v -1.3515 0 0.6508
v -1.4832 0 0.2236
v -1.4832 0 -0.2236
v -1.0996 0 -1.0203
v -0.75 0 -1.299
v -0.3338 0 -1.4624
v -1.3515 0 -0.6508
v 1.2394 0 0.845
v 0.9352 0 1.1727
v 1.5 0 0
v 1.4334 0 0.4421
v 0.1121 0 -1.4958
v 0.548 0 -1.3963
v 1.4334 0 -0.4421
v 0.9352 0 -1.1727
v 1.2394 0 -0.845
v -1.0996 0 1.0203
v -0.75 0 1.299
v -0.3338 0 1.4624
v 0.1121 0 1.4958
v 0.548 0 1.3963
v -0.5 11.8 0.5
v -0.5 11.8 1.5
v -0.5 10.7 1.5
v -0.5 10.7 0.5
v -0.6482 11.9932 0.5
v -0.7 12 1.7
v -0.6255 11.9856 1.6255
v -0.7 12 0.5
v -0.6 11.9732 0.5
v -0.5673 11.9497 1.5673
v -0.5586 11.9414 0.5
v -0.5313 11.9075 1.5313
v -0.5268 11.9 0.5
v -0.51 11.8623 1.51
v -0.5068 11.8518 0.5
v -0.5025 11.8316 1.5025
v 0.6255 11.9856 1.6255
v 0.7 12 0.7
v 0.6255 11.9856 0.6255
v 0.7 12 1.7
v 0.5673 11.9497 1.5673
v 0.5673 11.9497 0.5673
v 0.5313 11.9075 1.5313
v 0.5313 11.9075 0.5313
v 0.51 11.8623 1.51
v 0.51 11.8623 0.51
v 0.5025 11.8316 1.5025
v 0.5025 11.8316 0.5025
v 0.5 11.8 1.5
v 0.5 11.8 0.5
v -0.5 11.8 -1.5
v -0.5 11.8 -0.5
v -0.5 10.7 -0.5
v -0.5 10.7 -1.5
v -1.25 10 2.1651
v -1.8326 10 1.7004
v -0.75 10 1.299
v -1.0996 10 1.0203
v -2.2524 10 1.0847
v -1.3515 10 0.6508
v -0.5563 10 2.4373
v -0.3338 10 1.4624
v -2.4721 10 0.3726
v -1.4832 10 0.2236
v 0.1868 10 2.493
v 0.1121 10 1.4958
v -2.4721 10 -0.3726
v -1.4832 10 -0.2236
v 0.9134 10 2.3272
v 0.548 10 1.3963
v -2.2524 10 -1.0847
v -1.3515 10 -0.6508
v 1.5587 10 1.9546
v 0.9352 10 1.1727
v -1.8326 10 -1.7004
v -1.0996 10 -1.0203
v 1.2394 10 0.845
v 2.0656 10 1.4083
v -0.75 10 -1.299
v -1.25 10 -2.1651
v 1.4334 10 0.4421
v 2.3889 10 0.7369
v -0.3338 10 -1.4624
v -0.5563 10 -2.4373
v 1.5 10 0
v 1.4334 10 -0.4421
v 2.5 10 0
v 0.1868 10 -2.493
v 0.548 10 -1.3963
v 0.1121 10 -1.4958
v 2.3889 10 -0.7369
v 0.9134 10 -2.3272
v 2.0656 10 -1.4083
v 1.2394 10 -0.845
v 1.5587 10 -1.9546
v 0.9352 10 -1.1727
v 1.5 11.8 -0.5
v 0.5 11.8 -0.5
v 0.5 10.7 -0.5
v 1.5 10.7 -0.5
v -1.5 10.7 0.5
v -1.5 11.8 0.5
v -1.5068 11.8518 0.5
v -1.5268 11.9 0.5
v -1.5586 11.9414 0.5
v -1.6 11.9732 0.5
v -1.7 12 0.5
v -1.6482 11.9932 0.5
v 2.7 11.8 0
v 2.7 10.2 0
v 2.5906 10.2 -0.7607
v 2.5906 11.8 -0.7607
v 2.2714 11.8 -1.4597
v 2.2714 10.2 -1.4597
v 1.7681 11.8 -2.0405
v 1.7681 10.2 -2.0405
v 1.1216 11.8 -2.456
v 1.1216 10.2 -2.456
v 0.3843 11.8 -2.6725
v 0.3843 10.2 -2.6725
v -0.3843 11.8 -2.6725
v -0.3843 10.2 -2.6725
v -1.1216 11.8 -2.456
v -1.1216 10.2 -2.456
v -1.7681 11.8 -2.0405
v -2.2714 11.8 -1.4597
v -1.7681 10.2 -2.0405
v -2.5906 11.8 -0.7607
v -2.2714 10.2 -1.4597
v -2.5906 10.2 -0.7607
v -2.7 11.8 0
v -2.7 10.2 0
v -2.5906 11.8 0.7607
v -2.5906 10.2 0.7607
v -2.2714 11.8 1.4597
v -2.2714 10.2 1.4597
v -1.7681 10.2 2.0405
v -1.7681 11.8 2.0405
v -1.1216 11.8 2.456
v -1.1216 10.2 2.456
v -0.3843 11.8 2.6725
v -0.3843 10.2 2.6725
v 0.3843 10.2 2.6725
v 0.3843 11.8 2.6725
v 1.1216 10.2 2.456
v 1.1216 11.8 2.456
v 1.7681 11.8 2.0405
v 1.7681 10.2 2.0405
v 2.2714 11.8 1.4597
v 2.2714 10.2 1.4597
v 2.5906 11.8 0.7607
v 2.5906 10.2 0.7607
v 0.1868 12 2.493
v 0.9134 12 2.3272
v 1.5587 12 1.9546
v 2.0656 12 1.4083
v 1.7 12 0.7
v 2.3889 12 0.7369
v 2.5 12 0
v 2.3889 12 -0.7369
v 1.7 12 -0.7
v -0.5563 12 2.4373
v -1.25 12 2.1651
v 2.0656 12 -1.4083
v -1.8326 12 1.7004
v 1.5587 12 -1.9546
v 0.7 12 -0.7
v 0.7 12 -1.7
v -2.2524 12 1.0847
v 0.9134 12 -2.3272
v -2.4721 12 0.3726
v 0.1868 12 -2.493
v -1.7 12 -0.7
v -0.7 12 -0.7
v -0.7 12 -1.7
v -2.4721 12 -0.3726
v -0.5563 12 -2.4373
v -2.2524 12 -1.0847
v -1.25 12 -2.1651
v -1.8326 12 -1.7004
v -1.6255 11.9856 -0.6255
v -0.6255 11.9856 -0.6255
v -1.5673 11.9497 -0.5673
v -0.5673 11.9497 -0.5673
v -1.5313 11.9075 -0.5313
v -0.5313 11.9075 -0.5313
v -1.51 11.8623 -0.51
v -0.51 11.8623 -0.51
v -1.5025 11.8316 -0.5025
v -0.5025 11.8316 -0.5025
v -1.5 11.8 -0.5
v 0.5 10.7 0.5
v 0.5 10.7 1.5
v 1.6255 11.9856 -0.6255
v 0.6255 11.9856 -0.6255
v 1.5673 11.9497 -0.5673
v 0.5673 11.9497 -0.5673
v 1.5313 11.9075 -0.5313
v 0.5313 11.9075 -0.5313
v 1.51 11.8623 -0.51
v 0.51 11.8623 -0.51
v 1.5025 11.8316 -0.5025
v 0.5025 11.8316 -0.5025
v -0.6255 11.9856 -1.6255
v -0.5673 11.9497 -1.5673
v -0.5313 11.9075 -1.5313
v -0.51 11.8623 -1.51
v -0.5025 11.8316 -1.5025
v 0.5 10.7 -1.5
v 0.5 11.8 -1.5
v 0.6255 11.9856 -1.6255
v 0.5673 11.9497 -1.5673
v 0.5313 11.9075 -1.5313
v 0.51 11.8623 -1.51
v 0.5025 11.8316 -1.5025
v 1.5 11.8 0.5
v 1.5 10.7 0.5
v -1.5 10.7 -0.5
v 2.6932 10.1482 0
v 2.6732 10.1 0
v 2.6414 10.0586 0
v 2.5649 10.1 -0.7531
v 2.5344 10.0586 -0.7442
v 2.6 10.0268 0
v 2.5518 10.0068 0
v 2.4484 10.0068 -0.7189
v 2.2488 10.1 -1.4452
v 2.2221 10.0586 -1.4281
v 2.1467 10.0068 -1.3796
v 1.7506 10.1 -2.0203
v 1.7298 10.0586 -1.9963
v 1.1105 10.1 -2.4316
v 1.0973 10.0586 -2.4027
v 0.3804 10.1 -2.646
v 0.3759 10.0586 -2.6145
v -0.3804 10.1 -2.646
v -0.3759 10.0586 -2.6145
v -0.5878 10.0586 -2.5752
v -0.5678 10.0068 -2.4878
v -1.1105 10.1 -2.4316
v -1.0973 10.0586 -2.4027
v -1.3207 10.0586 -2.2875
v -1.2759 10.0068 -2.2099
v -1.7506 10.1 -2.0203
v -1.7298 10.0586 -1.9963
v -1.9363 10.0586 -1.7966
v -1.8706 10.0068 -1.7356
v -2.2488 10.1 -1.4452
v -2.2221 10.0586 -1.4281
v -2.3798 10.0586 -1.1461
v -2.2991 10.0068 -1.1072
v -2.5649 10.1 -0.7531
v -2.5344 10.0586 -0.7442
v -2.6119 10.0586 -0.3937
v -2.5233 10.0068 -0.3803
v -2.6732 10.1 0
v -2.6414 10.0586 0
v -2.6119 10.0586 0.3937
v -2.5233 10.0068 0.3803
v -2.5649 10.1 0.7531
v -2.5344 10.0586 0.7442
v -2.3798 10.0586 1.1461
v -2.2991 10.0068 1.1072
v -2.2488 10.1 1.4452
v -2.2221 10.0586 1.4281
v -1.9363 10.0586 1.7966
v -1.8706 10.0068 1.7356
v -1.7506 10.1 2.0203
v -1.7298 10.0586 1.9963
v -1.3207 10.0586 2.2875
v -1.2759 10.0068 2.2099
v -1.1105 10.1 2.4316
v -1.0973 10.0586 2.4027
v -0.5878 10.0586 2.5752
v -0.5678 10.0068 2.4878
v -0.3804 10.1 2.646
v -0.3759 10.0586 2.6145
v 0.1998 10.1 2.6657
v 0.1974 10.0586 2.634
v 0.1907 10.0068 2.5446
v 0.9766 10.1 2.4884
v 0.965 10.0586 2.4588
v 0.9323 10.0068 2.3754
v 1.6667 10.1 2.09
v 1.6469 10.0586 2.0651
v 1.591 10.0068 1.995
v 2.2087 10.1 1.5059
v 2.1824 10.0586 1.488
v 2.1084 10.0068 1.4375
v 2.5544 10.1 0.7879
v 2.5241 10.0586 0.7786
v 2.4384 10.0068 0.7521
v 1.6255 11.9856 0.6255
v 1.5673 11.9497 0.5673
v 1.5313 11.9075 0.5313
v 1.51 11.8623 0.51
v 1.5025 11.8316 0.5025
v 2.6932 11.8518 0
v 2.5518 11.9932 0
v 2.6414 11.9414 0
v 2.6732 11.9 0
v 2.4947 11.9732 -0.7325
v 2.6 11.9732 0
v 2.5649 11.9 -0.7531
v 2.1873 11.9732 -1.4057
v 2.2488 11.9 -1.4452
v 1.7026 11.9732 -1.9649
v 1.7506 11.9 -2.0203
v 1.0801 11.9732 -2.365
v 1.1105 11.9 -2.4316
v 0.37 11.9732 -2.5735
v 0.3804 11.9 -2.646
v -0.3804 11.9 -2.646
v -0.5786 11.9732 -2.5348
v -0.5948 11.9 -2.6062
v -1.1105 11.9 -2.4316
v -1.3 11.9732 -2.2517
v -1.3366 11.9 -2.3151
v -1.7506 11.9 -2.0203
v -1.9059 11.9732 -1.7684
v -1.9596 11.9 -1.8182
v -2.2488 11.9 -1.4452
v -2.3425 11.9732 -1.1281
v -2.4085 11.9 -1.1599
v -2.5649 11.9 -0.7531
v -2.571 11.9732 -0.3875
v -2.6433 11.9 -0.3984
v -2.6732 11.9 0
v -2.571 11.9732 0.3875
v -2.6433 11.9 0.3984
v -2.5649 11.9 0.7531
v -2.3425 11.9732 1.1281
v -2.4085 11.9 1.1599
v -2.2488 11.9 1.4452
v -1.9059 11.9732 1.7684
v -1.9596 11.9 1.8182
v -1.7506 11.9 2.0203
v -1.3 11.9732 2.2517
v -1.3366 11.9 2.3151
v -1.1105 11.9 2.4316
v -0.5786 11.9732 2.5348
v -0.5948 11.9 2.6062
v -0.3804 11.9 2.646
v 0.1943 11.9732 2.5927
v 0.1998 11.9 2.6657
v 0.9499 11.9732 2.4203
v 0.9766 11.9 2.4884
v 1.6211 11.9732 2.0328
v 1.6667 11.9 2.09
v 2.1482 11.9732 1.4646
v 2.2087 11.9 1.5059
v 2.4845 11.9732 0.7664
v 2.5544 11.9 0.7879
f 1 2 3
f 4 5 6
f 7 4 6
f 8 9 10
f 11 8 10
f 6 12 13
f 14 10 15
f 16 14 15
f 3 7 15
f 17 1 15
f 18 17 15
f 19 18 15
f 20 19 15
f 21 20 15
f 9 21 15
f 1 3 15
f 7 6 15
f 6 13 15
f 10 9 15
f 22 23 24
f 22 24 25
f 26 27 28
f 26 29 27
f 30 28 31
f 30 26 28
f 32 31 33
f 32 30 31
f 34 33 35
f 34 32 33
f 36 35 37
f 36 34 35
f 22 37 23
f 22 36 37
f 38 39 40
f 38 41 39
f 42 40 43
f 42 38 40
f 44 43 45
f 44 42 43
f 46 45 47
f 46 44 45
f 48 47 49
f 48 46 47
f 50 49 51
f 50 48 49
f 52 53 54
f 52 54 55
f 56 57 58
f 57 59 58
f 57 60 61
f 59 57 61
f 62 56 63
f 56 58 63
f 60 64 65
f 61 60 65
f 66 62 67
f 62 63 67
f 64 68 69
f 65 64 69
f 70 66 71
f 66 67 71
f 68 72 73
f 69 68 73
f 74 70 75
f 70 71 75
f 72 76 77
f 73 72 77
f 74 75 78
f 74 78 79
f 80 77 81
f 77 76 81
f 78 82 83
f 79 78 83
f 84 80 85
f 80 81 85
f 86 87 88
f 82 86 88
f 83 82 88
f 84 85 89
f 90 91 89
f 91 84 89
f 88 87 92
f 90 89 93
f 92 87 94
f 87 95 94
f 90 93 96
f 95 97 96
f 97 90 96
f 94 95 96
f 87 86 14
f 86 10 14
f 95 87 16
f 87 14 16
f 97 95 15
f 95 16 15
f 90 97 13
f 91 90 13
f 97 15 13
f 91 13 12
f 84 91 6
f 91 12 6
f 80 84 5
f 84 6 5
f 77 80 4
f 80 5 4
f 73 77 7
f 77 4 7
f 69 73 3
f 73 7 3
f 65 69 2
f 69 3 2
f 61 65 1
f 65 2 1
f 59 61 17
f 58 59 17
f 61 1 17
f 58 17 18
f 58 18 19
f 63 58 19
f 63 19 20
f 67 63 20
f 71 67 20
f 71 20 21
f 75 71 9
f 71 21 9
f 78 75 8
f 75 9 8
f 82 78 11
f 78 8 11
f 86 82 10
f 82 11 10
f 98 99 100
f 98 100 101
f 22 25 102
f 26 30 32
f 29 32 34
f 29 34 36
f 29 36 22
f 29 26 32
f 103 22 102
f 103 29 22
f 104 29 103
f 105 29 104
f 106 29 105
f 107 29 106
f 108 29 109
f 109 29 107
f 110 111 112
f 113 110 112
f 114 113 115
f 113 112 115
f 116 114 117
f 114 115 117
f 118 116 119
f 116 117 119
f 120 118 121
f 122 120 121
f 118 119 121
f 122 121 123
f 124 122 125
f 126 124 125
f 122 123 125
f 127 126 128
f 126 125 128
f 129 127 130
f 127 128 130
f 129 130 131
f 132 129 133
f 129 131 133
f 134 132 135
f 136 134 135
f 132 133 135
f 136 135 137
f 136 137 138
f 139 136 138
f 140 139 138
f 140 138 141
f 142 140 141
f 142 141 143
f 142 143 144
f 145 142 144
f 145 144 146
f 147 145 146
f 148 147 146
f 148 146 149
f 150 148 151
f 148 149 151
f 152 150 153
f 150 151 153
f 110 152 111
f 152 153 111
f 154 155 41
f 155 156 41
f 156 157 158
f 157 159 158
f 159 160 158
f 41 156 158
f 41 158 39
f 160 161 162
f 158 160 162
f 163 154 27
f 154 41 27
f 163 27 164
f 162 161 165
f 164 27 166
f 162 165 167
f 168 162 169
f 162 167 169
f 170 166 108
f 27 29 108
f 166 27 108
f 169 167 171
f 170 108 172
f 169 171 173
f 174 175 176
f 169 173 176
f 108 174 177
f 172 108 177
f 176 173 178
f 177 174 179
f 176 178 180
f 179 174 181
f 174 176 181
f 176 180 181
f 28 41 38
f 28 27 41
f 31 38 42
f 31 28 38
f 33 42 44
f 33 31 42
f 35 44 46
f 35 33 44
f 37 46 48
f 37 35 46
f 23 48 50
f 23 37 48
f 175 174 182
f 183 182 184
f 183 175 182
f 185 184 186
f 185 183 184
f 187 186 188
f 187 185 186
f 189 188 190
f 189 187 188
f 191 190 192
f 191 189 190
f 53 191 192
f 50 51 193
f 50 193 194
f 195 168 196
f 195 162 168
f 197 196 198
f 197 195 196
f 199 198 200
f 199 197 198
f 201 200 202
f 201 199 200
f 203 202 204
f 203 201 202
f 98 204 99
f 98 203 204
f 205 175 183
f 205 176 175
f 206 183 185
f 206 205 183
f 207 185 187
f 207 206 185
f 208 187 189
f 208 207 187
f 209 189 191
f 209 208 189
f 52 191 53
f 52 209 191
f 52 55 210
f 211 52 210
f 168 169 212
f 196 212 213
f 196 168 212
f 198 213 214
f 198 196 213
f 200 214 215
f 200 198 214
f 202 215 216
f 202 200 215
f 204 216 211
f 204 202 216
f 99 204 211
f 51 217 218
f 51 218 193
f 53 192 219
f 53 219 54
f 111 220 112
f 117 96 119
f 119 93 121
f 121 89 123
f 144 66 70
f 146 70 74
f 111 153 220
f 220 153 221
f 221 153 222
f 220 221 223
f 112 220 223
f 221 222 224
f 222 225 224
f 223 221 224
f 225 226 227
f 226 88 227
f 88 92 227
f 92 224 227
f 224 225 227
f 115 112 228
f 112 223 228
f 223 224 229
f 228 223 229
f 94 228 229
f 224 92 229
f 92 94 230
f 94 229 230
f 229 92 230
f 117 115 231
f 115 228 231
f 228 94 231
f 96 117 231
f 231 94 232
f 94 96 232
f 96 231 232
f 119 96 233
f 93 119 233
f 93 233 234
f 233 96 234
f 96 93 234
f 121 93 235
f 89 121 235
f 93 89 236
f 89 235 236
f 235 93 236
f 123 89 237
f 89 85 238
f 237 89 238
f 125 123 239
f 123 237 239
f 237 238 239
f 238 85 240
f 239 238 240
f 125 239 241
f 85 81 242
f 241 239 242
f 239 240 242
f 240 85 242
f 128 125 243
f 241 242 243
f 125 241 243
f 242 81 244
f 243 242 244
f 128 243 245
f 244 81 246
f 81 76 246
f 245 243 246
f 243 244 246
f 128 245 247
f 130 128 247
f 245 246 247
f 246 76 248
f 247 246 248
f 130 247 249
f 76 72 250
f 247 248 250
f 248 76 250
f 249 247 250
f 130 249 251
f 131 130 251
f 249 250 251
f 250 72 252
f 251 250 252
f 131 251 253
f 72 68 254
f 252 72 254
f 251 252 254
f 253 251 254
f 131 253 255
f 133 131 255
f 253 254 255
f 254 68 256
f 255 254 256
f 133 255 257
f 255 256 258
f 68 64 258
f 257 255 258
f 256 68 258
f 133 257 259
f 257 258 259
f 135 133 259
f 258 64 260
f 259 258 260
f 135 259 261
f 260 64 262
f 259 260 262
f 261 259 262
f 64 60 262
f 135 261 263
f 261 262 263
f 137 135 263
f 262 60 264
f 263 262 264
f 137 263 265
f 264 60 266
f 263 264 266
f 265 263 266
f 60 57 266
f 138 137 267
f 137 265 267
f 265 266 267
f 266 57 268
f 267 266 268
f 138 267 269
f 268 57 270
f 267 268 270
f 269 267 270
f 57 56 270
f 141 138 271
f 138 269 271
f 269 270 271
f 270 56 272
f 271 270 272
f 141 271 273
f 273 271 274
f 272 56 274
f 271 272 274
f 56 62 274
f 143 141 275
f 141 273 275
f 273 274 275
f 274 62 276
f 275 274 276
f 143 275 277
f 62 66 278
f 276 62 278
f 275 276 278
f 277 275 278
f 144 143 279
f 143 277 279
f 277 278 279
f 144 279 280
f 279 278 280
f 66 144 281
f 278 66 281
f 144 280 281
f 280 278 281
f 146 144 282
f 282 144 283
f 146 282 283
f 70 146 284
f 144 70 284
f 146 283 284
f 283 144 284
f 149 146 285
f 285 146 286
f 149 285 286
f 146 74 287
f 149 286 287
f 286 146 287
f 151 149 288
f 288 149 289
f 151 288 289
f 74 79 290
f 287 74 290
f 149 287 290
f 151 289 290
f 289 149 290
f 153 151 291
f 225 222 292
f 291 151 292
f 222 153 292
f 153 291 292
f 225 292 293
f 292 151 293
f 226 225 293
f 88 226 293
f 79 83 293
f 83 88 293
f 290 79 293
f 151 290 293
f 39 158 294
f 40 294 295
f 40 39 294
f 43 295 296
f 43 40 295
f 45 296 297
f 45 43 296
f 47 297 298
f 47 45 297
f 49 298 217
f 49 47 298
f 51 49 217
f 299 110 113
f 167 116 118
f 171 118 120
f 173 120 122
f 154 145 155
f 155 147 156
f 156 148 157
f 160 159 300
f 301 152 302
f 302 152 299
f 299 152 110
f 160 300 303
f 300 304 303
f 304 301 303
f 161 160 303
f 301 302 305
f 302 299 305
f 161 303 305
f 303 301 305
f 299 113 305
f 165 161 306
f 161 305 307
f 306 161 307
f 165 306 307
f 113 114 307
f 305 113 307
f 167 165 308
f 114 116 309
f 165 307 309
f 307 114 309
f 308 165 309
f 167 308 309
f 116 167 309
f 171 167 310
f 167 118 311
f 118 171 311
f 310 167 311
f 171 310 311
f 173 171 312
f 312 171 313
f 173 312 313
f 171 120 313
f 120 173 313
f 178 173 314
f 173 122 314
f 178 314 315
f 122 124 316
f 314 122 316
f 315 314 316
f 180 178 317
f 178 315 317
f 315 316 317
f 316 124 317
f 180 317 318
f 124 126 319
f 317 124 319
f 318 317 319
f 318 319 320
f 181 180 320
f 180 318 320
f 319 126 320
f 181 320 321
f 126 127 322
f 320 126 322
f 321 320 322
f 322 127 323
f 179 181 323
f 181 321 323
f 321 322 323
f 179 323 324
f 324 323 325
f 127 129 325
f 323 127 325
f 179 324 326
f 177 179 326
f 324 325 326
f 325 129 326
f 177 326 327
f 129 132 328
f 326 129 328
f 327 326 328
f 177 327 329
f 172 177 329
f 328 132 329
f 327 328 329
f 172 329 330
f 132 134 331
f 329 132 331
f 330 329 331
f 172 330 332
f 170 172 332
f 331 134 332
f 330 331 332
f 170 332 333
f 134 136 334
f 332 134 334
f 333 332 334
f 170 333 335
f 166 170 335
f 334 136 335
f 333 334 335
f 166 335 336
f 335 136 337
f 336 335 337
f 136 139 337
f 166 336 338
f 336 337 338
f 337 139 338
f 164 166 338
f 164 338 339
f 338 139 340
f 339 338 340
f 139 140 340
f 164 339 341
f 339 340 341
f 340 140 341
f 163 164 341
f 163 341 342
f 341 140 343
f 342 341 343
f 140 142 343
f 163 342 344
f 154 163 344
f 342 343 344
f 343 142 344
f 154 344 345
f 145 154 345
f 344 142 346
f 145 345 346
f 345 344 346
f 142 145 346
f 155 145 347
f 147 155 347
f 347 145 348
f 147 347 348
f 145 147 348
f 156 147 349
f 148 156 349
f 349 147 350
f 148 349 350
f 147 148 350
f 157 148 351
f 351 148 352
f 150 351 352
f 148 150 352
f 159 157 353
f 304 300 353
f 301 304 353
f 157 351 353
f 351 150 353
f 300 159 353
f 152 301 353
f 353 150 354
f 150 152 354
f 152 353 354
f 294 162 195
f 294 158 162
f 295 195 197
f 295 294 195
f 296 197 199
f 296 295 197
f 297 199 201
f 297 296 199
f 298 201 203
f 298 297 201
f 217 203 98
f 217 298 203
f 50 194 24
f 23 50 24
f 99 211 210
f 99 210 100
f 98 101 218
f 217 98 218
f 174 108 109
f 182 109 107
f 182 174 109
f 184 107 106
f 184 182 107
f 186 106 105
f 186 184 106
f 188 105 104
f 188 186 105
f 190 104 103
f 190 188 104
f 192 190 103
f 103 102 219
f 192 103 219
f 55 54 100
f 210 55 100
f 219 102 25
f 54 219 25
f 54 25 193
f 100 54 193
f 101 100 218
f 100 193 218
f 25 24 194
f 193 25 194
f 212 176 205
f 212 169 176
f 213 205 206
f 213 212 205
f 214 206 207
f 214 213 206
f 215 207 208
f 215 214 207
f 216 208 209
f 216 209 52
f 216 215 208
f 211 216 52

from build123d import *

# Parameters (mm, degrees)
FILLET_R     = 0.2
POCKET_DEPTH = 1.3
FILLET001_R  = 0.2


with BuildPart() as part:
    # Sketch → Revolution (revolve)
    with BuildSketch(Plane.XY):
        Polygon((0, 0), (0, 12), (2.7, 12), (2.7, 10), (1.5, 10), (1.5, 0), align=None)
    revolve(axis=Axis((0, 0, 0), (0, 1, 0)))

    # Fillet
    fillet_edges = [part.edges().sort_by_distance(p)[0] for p in [
        (-2.7, 10, 0),
        (-2.7, 12, 0),
    ]]
    fillet(fillet_edges, radius=FILLET_R)

    # Sketch001 (on Face1 of Fillet) → Pocket (cut)
    with BuildSketch(Plane(origin=(0, 12, 0), x_dir=(-1, 0, 0), z_dir=(0, 1, 0))):
        Polygon((0.5, 1.5), (0.5, 0.5), (1.5, 0.5), (1.5, -0.5), (0.5, -0.5), (0.5, -1.5), (-0.5, -1.5), (-0.5, -0.5), (-1.5, -0.5), (-1.5, 0.5), (-0.5, 0.5), (-0.5, 1.5), align=None)
    extrude(amount=-POCKET_DEPTH, mode=Mode.SUBTRACT)

    # Fillet001
    fillet001_edges = [part.edges().sort_by_distance(p)[0] for p in [
        (0, 12, -1.5),
        (0.5, 12, -1),
        (1, 12, -0.5),
        (1.5, 12, 0),
        (1, 12, 0.5),
        (0.5, 12, 1),
        (-0.5, 12, 1),
        (0, 12, 1.5),
        (-1.5, 12, 0),
        (-1, 12, -0.5),
        (-0.5, 12, -1),
    ]]
    fillet(fillet001_edges, radius=FILLET001_R)


solid = part.part
